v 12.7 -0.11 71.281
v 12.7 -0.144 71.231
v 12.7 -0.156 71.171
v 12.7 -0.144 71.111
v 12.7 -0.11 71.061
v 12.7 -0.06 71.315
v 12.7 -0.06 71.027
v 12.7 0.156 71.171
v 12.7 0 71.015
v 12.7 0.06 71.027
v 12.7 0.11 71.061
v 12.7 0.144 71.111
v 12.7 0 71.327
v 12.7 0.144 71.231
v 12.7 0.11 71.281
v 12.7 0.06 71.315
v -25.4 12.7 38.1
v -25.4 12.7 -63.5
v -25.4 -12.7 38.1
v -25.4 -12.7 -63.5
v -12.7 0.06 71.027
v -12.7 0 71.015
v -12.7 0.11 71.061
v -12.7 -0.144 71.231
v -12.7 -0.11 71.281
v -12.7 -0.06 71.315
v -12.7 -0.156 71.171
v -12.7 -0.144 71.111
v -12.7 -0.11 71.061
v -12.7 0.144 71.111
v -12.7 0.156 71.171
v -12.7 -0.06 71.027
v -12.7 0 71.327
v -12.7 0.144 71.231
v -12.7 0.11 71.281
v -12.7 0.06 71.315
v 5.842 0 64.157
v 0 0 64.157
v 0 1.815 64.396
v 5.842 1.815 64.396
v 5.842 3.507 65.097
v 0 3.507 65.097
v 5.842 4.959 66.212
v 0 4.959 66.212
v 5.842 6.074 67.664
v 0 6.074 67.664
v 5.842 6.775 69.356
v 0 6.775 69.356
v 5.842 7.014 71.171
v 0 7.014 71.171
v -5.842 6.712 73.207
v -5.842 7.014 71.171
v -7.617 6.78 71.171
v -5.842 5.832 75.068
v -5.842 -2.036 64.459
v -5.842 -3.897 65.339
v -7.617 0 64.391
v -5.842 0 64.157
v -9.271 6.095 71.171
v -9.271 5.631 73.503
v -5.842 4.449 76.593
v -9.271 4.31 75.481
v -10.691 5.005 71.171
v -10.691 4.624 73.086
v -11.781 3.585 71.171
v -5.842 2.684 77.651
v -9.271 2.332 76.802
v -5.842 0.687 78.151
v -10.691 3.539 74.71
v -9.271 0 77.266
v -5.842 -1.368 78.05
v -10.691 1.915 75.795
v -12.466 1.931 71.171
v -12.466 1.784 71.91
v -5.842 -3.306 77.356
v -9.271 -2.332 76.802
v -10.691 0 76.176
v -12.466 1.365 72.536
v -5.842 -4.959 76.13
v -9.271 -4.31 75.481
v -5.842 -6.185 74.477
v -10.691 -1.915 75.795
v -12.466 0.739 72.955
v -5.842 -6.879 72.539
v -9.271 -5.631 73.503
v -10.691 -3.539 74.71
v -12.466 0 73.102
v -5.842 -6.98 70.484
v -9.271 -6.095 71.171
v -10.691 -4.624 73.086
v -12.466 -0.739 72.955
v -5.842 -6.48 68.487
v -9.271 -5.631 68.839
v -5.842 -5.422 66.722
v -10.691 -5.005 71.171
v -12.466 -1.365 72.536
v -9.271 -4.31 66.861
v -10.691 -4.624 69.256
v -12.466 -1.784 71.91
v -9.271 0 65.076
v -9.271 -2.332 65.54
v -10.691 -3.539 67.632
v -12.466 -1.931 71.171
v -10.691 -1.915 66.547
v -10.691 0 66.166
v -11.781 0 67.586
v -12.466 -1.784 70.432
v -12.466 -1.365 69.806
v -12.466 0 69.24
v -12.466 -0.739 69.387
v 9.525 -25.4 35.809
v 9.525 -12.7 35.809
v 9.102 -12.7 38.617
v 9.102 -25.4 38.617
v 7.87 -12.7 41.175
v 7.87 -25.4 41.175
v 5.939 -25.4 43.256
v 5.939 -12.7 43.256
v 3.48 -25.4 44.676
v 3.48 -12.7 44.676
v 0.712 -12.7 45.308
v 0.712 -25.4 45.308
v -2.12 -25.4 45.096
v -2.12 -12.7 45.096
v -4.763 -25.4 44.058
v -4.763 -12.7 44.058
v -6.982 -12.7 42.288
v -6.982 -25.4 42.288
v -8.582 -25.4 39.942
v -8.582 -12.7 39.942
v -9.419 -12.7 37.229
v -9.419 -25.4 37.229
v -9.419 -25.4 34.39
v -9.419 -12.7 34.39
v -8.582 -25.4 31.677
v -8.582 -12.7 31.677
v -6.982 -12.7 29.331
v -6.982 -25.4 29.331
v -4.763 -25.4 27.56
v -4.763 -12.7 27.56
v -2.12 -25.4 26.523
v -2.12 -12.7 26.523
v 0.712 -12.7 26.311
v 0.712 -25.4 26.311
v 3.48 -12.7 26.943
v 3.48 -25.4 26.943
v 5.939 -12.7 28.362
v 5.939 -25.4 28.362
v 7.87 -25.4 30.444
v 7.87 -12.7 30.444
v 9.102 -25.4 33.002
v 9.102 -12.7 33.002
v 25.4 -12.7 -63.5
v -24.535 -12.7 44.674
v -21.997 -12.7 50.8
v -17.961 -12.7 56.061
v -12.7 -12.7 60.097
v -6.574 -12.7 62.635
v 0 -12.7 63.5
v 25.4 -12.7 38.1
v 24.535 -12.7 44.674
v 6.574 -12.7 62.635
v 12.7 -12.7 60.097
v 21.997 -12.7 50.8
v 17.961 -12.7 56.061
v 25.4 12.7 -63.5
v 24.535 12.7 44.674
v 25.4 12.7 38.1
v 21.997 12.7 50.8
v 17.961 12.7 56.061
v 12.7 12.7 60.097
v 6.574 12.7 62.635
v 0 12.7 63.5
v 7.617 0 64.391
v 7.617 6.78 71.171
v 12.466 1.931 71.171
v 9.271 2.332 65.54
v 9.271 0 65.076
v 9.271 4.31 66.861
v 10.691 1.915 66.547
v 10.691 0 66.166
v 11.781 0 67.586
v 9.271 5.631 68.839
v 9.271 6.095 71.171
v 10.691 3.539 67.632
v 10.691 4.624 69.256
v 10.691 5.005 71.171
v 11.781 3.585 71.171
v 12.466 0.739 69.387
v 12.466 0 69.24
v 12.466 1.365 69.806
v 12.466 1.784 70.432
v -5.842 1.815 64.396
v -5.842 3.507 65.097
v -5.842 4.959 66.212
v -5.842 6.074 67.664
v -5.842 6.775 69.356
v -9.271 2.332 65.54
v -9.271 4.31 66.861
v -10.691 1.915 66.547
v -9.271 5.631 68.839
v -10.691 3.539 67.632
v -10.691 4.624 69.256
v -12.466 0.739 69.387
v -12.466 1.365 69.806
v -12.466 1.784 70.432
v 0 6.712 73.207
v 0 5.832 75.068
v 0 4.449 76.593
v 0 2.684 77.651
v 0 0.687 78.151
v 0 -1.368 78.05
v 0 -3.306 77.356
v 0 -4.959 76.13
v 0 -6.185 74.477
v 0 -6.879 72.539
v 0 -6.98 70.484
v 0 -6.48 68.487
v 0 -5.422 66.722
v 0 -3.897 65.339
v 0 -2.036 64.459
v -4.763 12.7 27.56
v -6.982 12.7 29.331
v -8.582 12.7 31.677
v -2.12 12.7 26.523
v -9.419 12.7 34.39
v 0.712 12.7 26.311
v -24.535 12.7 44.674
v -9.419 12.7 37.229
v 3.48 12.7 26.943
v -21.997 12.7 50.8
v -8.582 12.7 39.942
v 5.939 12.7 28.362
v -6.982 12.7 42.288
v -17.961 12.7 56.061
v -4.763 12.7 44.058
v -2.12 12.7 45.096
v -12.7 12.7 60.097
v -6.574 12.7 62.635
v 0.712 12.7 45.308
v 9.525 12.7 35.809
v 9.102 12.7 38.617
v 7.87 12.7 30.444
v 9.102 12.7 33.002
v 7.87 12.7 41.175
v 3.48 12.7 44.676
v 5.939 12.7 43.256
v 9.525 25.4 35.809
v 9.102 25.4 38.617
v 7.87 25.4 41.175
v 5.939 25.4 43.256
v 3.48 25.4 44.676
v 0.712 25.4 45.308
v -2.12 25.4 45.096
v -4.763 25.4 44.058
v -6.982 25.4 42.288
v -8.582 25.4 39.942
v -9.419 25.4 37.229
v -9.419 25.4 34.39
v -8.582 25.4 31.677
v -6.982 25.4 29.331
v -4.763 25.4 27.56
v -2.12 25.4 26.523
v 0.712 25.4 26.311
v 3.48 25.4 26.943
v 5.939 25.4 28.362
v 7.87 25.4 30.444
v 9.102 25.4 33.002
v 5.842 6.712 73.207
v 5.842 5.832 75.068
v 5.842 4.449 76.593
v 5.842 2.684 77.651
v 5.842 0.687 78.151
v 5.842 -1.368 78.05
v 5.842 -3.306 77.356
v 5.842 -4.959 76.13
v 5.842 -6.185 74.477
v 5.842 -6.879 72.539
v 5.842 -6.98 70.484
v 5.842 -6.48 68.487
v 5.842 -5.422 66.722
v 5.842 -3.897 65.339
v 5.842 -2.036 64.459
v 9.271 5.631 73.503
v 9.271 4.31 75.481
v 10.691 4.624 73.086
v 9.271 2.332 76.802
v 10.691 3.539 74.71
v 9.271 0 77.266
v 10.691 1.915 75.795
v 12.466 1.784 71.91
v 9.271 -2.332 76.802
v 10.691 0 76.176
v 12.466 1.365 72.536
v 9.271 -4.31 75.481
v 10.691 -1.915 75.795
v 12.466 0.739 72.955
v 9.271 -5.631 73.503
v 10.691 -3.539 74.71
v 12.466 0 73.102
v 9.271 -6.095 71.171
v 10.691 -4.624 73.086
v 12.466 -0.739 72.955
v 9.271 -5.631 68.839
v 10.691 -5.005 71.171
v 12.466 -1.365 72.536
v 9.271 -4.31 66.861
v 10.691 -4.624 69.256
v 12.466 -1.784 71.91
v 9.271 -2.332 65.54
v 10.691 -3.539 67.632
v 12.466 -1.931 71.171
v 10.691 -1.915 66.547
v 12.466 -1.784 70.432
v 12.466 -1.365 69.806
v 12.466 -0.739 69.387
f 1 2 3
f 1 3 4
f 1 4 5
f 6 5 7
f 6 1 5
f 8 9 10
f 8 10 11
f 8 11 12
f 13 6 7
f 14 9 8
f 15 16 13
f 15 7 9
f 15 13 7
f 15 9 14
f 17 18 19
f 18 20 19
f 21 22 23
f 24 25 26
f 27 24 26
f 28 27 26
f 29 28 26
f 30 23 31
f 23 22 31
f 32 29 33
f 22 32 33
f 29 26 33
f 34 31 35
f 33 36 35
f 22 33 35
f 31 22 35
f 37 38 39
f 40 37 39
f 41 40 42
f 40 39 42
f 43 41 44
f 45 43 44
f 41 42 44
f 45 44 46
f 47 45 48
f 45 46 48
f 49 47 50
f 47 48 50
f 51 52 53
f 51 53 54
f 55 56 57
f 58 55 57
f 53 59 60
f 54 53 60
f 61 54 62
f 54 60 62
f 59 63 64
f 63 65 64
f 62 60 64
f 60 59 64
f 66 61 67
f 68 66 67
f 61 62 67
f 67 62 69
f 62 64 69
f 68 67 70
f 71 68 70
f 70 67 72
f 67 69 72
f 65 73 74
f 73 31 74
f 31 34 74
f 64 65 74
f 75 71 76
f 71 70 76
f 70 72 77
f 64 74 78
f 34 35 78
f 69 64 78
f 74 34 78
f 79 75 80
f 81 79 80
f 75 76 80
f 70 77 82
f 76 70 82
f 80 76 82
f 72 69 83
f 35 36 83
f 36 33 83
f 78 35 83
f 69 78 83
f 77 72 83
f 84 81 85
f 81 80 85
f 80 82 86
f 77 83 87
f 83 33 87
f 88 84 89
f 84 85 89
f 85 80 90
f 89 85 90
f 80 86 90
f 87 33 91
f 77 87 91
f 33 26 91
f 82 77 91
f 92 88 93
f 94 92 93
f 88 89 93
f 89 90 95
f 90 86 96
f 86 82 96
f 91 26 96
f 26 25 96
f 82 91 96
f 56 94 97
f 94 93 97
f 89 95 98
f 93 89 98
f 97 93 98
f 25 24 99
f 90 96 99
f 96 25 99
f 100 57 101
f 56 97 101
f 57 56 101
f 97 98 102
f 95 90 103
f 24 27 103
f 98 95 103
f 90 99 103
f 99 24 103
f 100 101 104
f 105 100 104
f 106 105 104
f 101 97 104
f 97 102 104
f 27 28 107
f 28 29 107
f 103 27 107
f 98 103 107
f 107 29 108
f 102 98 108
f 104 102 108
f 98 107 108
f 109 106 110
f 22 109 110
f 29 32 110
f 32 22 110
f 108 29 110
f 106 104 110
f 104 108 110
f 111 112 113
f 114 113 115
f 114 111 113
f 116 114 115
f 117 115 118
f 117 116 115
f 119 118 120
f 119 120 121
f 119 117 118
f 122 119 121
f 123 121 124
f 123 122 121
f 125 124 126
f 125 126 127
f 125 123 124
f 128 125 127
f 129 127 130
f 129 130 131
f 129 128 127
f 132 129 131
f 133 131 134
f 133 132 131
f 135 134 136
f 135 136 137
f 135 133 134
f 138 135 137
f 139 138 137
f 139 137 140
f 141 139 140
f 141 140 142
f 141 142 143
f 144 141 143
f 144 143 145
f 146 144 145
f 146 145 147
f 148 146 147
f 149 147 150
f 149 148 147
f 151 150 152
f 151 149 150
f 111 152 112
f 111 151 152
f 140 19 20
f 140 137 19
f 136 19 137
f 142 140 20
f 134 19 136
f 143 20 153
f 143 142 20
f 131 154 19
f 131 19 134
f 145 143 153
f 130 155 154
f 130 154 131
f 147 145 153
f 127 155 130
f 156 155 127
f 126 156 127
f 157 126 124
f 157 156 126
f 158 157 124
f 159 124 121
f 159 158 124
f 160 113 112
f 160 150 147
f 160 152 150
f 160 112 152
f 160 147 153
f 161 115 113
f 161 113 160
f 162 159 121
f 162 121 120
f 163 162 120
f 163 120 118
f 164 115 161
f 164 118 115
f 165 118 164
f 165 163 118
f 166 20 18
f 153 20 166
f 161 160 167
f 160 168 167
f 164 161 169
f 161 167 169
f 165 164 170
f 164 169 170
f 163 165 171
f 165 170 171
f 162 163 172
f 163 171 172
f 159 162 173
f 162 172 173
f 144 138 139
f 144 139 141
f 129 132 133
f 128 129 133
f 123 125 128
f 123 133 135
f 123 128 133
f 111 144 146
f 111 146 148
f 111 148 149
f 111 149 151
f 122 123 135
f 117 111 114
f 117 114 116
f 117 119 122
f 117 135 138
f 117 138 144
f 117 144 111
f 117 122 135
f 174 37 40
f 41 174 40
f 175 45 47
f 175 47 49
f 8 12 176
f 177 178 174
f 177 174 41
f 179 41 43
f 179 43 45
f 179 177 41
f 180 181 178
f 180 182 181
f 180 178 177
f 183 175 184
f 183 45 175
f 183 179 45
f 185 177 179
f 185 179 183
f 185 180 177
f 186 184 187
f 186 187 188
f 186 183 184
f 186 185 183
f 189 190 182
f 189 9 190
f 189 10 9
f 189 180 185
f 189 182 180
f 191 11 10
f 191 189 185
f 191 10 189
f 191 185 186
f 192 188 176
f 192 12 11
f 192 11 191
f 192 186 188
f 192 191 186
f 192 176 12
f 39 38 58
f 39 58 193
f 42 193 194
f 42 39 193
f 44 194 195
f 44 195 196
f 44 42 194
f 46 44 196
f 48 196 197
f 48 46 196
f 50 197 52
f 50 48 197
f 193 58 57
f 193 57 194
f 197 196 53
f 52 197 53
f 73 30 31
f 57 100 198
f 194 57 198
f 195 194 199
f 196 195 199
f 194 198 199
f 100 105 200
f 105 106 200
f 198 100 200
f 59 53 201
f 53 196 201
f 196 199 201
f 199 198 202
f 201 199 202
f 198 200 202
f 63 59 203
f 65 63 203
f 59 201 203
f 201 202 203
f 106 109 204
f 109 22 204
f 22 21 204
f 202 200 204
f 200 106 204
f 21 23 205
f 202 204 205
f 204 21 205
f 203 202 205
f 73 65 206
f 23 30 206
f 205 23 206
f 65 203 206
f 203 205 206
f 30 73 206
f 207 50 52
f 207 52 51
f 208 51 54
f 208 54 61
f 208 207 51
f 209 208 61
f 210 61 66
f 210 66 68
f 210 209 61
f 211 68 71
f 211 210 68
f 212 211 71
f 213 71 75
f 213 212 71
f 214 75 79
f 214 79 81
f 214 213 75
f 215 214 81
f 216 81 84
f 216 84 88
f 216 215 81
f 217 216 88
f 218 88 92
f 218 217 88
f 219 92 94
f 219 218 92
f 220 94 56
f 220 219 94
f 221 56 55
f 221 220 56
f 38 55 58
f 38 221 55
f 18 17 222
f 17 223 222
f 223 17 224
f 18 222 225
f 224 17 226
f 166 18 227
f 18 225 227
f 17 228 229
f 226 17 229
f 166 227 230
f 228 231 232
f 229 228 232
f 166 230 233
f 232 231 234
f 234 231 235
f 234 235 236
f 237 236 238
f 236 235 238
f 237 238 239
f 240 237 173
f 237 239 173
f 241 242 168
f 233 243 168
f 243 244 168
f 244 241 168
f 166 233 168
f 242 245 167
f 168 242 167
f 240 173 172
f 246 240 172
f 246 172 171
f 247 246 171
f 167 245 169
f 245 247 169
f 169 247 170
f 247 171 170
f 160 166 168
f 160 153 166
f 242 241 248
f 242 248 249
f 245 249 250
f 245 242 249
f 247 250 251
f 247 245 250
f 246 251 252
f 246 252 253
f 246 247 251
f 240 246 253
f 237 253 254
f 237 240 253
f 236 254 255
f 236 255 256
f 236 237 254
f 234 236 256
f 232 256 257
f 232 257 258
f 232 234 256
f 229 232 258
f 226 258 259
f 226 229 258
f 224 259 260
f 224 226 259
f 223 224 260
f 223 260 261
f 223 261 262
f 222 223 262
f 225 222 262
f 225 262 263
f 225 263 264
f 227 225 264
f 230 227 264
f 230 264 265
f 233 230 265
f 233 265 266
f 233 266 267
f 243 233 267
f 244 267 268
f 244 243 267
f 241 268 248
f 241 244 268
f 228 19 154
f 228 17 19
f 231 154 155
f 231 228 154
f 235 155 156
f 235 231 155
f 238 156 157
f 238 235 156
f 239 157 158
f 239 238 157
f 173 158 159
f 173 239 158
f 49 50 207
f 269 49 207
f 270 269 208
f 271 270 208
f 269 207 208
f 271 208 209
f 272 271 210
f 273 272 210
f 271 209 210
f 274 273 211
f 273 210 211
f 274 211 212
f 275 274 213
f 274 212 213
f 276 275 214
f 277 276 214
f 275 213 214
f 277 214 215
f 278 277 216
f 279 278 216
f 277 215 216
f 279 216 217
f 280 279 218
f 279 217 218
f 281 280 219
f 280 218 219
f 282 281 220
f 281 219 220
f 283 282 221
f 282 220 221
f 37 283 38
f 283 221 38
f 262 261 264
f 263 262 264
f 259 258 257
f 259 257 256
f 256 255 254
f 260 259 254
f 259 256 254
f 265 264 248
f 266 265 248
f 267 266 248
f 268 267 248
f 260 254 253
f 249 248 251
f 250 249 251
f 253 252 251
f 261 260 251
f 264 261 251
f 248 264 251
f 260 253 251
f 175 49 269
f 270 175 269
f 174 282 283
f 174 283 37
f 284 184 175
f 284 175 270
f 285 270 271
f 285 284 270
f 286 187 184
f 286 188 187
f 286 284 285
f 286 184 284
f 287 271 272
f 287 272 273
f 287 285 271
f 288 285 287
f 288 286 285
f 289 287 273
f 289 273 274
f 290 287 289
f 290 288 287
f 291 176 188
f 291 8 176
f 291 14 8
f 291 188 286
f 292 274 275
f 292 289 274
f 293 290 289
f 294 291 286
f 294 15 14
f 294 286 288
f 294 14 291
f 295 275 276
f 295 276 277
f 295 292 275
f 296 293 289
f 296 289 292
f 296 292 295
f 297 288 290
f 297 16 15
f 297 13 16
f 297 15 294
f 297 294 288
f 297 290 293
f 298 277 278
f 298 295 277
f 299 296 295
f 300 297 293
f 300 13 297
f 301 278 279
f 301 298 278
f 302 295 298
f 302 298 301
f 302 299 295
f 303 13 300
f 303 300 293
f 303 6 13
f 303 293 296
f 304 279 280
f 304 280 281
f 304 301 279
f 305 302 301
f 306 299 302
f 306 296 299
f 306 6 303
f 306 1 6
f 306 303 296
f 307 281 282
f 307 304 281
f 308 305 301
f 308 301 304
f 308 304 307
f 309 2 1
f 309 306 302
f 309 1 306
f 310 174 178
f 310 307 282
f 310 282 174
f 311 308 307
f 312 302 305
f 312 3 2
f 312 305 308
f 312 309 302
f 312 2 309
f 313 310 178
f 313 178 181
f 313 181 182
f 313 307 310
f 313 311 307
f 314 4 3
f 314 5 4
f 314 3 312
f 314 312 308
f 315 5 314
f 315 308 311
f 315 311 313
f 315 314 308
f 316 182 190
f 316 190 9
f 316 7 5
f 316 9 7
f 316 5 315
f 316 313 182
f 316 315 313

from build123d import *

# Parameters (mm, degrees)
F0_W     = 50.8
F0_H     = 127
F1_DEPTH = 12.7
F2_R     = 25.39999
F3_R     = 9.525
F4_DEPTH = 25.4
F6_DEPTH = 12.7
F7_R     = 6.858


# Not quite as in the source:
# - a fillet or chamfer is up to 0.001 mm smaller than in the source, because OpenCascade refuses the exact size


with BuildPart() as f1:
    # F0 (on Front) → F1 (new body, symmetric)
    with BuildSketch(Plane.XZ):
        Rectangle(F0_W, F0_H)
    extrude(amount=F1_DEPTH, both=True)

    # F2 (radius 25.4 in the source; OpenCascade refuses exactly that, so slightly less here)
    f2_edges = [f1.edges().sort_by_distance(p)[0] for p in [
        (-25.4, 0, 63.5),
        (25.4, 0, 63.5),
    ]]
    fillet(f2_edges, radius=F2_R)

    # F3 (on Front) → F4 (join, symmetric)
    with BuildSketch(Plane.XZ):
        with Locations((0, 35.8093136142)):
            Circle(F3_R)
    extrude(amount=F4_DEPTH, both=True)


with BuildPart() as f6:
    # F5 (on Right) → F6 (new body, symmetric)
    with BuildSketch(Plane.YZ):
        with BuildLine():
            ThreePointArc((0, 64.1574280324), (4.9593605279, 66.2116624237), (7.0135949192, 71.1710229516))
            ThreePointArc((7.0135949192, 71.1710229516), (-4.9593605279, 76.1303834795), (0, 64.1574280324))
        make_face()
    extrude(amount=F6_DEPTH, both=True)

    # F7
    f7_edges = [f6.edges().sort_by_distance(p)[0] for p in [
        (-12.7, -4.959361, 76.130383),
        (12.7, 4.959361, 66.211662),
        (12.7, -4.959361, 76.130383),
    ]]
    fillet(f7_edges, radius=F7_R)


solid = Compound([f1.part, f6.part])
